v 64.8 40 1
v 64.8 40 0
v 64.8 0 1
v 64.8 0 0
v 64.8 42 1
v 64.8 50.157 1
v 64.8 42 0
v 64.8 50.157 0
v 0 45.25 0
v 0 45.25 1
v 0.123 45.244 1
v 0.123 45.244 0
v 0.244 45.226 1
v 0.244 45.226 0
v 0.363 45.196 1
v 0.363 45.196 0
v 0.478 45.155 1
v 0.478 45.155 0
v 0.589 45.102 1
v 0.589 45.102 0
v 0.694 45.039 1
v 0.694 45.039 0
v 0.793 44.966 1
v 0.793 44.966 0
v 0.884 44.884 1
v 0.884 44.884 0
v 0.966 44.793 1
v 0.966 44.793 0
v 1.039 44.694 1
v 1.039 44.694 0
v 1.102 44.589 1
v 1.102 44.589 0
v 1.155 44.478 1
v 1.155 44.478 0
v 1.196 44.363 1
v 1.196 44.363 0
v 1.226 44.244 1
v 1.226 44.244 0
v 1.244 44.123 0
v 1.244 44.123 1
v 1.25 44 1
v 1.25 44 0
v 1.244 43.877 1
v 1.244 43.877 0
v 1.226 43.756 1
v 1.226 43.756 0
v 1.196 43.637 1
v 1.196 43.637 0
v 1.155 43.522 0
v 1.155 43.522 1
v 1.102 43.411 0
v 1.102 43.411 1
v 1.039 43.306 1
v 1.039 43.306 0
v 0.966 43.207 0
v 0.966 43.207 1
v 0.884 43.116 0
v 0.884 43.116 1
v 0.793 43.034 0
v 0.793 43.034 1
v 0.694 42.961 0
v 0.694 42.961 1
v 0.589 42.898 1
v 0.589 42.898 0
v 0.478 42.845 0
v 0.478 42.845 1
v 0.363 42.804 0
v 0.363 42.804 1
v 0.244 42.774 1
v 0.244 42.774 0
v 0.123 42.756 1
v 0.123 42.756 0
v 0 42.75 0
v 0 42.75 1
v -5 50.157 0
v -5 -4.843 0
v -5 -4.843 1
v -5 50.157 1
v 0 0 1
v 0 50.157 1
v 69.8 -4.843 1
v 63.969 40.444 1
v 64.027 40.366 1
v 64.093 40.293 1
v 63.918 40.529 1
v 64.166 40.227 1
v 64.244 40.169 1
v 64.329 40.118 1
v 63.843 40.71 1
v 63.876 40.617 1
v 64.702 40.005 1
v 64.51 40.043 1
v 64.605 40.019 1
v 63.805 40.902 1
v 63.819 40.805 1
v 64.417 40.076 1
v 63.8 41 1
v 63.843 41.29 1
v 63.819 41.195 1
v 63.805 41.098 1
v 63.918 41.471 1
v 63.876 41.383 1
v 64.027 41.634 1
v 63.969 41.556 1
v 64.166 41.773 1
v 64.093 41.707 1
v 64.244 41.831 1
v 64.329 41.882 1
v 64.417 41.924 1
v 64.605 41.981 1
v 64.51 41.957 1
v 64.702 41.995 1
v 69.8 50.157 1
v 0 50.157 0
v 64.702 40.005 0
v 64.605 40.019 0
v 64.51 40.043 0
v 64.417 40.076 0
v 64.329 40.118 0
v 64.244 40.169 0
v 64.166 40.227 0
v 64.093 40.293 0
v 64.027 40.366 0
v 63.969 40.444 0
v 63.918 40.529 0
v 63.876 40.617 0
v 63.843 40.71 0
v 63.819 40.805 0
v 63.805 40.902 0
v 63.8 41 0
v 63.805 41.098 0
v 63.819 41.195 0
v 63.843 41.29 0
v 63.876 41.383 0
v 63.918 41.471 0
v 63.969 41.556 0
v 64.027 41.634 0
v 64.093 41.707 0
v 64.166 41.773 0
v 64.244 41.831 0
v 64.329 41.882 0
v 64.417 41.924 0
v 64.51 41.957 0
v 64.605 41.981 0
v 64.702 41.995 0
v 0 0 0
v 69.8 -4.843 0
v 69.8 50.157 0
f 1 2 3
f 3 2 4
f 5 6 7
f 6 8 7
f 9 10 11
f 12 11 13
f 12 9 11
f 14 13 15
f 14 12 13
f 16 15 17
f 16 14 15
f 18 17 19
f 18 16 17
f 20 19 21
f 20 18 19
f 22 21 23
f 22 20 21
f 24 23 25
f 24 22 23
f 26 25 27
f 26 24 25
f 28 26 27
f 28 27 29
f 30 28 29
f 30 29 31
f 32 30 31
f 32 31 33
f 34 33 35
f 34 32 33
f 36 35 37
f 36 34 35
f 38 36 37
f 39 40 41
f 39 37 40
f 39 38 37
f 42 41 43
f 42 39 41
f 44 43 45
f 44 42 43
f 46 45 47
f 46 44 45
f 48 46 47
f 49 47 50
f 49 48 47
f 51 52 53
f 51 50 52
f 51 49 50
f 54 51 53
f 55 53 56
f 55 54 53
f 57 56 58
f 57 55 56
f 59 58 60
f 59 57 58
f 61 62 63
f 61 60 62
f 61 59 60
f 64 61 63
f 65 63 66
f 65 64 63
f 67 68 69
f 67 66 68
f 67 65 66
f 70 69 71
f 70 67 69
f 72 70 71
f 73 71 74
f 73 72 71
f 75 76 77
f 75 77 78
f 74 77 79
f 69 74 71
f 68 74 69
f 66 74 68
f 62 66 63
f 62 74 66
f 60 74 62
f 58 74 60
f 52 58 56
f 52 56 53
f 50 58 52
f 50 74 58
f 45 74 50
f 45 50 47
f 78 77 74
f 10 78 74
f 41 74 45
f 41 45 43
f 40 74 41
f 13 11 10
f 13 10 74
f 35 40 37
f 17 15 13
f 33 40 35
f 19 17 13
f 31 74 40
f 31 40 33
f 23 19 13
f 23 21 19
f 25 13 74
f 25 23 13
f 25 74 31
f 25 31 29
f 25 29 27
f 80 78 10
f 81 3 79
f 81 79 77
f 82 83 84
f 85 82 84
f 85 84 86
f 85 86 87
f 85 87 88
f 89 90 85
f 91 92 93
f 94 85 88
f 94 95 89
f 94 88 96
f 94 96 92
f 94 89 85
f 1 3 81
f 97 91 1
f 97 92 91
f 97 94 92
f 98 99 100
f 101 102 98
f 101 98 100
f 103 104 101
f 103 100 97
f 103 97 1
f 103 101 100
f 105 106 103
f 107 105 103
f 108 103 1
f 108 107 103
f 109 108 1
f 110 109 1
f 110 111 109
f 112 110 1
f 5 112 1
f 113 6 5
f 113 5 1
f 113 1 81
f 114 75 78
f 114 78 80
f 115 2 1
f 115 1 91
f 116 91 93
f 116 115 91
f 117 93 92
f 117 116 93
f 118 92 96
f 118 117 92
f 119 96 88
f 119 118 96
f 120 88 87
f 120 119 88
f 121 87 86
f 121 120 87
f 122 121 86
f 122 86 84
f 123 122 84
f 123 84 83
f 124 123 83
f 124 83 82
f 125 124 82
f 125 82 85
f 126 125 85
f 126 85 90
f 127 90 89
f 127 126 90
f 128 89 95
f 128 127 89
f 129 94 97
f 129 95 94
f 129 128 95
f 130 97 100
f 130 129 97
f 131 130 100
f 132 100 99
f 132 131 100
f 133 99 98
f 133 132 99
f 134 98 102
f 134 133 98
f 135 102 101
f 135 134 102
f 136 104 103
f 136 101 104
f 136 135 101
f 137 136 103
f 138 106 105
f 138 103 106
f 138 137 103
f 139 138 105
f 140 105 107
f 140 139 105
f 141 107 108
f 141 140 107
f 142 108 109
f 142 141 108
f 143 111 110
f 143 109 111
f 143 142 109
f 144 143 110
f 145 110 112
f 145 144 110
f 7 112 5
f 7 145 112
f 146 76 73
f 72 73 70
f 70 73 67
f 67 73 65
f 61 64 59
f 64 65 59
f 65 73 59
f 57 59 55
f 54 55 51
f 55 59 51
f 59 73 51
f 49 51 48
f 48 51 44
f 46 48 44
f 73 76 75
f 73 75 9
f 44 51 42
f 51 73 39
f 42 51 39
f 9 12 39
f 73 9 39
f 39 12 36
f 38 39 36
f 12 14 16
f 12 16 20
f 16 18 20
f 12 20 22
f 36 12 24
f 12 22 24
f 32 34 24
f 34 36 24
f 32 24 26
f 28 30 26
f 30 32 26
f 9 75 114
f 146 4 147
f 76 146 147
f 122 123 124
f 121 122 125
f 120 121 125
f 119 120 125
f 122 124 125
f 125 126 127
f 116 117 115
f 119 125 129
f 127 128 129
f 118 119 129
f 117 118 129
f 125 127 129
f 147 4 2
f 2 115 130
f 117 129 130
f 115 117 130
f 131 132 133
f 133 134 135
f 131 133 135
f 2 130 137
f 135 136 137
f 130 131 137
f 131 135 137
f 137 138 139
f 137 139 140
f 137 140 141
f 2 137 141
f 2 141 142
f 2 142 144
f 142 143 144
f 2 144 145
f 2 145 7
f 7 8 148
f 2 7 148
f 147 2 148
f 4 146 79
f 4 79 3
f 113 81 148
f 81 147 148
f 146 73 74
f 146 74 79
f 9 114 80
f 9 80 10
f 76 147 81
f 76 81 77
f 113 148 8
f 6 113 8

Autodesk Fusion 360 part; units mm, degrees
sketch "Sketch1" plane through (0, 0, 0) normal (0, 0, 1) x (1, 0, 0)
  line L0 (0, 0) -> (64.8, 0)
  line L1 (64.8, 0) -> (64.8, -4.8432)
  line L2 (64.8, -4.8432) -> (0, -4.8432)
  line L3 (0, -4.8432) -> (0, 0)
  line L4 (0, -4.8432) -> (-5, -4.8432)
  line L5 (-5, -4.8432) -> (-5, 50.1568)
  line L6 (-5, 50.1568) -> (0, 50.1568)
  line L7 (0, 50.1568) -> (0, -4.8432)
  line L8 (64.8, -4.8432) -> (69.8, -4.8432)
  line L9 (69.8, -4.8432) -> (69.8, 50.1568)
  line L10 (69.8, 50.1568) -> (64.8, 50.1568)
  line L11 (64.8, 50.1568) -> (64.8, -4.8432)
  line L12 (64.8, 42.25) -> (64.8, 39.75)
  circle A0 centre (64.8, 41) radius 1
  circle A1 centre (0, 44) radius 1.25
  dimension "d1" = 64.8
  dimension "d2" = 5
  dimension "d3" = 5
  dimension "d4" = 55
  dimension "d5" = 55
  dimension "d6" = 2.5
  dimension "d7" = 2
  dimension "d8" = 2.5
  dimension "d31" = 44
  dimension "d34" = 41
extrude "Extrude1" add sketch "Sketch1" along normal blind 1
sketch "Sketch2" plane through (0, 0, 1) normal (0, 0, 1) x (-1, 0, 0)
  line L0 (0, 0) -> (0, -42.75)
  arc A0 (0, -42.75) -> (0, -45.25) centre (0, -44) ccw
  line L1 (0, -45.25) -> (0, -50.1568)
  line L2 (0, -50.1568) -> (5, -50.1568)
  line L3 (5, -50.1568) -> (5, 4.8432)
  line L4 (5, 4.8432) -> (-69.8, 4.8432)
  line L5 (-69.8, 4.8432) -> (-69.8, -50.1568)
  line L6 (-69.8, -50.1568) -> (-64.8, -50.1568)
  line L7 (-64.8, -50.1568) -> (-64.8, -42)
  arc A1 (-64.8, -42) -> (-64.8, -40) centre (-64.8, -41) ccw
  line L8 (-64.8, -40) -> (-64.8, 0)
  line L9 (-64.8, 0) -> (0, 0)
  line L10 (5, -50.1568) -> (-2.5, -50.1568)
  line L11 (-2.5, -50.1568) -> (-2.5, -30.1568)
  line L12 (-2.5, -30.1568) -> (5, -30.1568)
  line L13 (5, -30.1568) -> (5, -50.1568)
  line L14 (-69.8, -50.1568) -> (-62.3, -50.1568)
  line L15 (-62.3, -50.1568) -> (-62.3, -30.1568)
  line L16 (-62.3, -30.1568) -> (-69.8, -30.1568)
  line L17 (-69.8, -30.1568) -> (-69.8, -50.1568)
  line L18 (5, 4.8432) -> (-69.8, 4.8432)
  line L19 (-69.8, 4.8432) -> (-69.8, -1.6568)
  line L20 (-69.8, -1.6568) -> (5, -1.6568)
  line L21 (5, -1.6568) -> (5, 4.8432)
  dimension "d11" = 7.5
  dimension "d12" = 20
  dimension "d13" = 7.5
  dimension "d14" = 20
  dimension "d25" = 6.5
extrude "Extrude2" [suppressed]
fillet "Fillet1" [suppressed]
fillet "Fillet2" [suppressed]
fillet "Fillet3" [suppressed]
fillet "Fillet4" [suppressed]
fillet "Fillet5" [suppressed]
mirror "Mirror1" [suppressed]
equation "d1 = 64.3 mm + 0.5 mm"
equation "d2 = d3"
equation "d5 = d4"
equation "d11 = d13"
equation "d14 = d12"
equation "d31 = 42 mm + 2 mm"
equation "d34 = 39 mm + 2 mm"
